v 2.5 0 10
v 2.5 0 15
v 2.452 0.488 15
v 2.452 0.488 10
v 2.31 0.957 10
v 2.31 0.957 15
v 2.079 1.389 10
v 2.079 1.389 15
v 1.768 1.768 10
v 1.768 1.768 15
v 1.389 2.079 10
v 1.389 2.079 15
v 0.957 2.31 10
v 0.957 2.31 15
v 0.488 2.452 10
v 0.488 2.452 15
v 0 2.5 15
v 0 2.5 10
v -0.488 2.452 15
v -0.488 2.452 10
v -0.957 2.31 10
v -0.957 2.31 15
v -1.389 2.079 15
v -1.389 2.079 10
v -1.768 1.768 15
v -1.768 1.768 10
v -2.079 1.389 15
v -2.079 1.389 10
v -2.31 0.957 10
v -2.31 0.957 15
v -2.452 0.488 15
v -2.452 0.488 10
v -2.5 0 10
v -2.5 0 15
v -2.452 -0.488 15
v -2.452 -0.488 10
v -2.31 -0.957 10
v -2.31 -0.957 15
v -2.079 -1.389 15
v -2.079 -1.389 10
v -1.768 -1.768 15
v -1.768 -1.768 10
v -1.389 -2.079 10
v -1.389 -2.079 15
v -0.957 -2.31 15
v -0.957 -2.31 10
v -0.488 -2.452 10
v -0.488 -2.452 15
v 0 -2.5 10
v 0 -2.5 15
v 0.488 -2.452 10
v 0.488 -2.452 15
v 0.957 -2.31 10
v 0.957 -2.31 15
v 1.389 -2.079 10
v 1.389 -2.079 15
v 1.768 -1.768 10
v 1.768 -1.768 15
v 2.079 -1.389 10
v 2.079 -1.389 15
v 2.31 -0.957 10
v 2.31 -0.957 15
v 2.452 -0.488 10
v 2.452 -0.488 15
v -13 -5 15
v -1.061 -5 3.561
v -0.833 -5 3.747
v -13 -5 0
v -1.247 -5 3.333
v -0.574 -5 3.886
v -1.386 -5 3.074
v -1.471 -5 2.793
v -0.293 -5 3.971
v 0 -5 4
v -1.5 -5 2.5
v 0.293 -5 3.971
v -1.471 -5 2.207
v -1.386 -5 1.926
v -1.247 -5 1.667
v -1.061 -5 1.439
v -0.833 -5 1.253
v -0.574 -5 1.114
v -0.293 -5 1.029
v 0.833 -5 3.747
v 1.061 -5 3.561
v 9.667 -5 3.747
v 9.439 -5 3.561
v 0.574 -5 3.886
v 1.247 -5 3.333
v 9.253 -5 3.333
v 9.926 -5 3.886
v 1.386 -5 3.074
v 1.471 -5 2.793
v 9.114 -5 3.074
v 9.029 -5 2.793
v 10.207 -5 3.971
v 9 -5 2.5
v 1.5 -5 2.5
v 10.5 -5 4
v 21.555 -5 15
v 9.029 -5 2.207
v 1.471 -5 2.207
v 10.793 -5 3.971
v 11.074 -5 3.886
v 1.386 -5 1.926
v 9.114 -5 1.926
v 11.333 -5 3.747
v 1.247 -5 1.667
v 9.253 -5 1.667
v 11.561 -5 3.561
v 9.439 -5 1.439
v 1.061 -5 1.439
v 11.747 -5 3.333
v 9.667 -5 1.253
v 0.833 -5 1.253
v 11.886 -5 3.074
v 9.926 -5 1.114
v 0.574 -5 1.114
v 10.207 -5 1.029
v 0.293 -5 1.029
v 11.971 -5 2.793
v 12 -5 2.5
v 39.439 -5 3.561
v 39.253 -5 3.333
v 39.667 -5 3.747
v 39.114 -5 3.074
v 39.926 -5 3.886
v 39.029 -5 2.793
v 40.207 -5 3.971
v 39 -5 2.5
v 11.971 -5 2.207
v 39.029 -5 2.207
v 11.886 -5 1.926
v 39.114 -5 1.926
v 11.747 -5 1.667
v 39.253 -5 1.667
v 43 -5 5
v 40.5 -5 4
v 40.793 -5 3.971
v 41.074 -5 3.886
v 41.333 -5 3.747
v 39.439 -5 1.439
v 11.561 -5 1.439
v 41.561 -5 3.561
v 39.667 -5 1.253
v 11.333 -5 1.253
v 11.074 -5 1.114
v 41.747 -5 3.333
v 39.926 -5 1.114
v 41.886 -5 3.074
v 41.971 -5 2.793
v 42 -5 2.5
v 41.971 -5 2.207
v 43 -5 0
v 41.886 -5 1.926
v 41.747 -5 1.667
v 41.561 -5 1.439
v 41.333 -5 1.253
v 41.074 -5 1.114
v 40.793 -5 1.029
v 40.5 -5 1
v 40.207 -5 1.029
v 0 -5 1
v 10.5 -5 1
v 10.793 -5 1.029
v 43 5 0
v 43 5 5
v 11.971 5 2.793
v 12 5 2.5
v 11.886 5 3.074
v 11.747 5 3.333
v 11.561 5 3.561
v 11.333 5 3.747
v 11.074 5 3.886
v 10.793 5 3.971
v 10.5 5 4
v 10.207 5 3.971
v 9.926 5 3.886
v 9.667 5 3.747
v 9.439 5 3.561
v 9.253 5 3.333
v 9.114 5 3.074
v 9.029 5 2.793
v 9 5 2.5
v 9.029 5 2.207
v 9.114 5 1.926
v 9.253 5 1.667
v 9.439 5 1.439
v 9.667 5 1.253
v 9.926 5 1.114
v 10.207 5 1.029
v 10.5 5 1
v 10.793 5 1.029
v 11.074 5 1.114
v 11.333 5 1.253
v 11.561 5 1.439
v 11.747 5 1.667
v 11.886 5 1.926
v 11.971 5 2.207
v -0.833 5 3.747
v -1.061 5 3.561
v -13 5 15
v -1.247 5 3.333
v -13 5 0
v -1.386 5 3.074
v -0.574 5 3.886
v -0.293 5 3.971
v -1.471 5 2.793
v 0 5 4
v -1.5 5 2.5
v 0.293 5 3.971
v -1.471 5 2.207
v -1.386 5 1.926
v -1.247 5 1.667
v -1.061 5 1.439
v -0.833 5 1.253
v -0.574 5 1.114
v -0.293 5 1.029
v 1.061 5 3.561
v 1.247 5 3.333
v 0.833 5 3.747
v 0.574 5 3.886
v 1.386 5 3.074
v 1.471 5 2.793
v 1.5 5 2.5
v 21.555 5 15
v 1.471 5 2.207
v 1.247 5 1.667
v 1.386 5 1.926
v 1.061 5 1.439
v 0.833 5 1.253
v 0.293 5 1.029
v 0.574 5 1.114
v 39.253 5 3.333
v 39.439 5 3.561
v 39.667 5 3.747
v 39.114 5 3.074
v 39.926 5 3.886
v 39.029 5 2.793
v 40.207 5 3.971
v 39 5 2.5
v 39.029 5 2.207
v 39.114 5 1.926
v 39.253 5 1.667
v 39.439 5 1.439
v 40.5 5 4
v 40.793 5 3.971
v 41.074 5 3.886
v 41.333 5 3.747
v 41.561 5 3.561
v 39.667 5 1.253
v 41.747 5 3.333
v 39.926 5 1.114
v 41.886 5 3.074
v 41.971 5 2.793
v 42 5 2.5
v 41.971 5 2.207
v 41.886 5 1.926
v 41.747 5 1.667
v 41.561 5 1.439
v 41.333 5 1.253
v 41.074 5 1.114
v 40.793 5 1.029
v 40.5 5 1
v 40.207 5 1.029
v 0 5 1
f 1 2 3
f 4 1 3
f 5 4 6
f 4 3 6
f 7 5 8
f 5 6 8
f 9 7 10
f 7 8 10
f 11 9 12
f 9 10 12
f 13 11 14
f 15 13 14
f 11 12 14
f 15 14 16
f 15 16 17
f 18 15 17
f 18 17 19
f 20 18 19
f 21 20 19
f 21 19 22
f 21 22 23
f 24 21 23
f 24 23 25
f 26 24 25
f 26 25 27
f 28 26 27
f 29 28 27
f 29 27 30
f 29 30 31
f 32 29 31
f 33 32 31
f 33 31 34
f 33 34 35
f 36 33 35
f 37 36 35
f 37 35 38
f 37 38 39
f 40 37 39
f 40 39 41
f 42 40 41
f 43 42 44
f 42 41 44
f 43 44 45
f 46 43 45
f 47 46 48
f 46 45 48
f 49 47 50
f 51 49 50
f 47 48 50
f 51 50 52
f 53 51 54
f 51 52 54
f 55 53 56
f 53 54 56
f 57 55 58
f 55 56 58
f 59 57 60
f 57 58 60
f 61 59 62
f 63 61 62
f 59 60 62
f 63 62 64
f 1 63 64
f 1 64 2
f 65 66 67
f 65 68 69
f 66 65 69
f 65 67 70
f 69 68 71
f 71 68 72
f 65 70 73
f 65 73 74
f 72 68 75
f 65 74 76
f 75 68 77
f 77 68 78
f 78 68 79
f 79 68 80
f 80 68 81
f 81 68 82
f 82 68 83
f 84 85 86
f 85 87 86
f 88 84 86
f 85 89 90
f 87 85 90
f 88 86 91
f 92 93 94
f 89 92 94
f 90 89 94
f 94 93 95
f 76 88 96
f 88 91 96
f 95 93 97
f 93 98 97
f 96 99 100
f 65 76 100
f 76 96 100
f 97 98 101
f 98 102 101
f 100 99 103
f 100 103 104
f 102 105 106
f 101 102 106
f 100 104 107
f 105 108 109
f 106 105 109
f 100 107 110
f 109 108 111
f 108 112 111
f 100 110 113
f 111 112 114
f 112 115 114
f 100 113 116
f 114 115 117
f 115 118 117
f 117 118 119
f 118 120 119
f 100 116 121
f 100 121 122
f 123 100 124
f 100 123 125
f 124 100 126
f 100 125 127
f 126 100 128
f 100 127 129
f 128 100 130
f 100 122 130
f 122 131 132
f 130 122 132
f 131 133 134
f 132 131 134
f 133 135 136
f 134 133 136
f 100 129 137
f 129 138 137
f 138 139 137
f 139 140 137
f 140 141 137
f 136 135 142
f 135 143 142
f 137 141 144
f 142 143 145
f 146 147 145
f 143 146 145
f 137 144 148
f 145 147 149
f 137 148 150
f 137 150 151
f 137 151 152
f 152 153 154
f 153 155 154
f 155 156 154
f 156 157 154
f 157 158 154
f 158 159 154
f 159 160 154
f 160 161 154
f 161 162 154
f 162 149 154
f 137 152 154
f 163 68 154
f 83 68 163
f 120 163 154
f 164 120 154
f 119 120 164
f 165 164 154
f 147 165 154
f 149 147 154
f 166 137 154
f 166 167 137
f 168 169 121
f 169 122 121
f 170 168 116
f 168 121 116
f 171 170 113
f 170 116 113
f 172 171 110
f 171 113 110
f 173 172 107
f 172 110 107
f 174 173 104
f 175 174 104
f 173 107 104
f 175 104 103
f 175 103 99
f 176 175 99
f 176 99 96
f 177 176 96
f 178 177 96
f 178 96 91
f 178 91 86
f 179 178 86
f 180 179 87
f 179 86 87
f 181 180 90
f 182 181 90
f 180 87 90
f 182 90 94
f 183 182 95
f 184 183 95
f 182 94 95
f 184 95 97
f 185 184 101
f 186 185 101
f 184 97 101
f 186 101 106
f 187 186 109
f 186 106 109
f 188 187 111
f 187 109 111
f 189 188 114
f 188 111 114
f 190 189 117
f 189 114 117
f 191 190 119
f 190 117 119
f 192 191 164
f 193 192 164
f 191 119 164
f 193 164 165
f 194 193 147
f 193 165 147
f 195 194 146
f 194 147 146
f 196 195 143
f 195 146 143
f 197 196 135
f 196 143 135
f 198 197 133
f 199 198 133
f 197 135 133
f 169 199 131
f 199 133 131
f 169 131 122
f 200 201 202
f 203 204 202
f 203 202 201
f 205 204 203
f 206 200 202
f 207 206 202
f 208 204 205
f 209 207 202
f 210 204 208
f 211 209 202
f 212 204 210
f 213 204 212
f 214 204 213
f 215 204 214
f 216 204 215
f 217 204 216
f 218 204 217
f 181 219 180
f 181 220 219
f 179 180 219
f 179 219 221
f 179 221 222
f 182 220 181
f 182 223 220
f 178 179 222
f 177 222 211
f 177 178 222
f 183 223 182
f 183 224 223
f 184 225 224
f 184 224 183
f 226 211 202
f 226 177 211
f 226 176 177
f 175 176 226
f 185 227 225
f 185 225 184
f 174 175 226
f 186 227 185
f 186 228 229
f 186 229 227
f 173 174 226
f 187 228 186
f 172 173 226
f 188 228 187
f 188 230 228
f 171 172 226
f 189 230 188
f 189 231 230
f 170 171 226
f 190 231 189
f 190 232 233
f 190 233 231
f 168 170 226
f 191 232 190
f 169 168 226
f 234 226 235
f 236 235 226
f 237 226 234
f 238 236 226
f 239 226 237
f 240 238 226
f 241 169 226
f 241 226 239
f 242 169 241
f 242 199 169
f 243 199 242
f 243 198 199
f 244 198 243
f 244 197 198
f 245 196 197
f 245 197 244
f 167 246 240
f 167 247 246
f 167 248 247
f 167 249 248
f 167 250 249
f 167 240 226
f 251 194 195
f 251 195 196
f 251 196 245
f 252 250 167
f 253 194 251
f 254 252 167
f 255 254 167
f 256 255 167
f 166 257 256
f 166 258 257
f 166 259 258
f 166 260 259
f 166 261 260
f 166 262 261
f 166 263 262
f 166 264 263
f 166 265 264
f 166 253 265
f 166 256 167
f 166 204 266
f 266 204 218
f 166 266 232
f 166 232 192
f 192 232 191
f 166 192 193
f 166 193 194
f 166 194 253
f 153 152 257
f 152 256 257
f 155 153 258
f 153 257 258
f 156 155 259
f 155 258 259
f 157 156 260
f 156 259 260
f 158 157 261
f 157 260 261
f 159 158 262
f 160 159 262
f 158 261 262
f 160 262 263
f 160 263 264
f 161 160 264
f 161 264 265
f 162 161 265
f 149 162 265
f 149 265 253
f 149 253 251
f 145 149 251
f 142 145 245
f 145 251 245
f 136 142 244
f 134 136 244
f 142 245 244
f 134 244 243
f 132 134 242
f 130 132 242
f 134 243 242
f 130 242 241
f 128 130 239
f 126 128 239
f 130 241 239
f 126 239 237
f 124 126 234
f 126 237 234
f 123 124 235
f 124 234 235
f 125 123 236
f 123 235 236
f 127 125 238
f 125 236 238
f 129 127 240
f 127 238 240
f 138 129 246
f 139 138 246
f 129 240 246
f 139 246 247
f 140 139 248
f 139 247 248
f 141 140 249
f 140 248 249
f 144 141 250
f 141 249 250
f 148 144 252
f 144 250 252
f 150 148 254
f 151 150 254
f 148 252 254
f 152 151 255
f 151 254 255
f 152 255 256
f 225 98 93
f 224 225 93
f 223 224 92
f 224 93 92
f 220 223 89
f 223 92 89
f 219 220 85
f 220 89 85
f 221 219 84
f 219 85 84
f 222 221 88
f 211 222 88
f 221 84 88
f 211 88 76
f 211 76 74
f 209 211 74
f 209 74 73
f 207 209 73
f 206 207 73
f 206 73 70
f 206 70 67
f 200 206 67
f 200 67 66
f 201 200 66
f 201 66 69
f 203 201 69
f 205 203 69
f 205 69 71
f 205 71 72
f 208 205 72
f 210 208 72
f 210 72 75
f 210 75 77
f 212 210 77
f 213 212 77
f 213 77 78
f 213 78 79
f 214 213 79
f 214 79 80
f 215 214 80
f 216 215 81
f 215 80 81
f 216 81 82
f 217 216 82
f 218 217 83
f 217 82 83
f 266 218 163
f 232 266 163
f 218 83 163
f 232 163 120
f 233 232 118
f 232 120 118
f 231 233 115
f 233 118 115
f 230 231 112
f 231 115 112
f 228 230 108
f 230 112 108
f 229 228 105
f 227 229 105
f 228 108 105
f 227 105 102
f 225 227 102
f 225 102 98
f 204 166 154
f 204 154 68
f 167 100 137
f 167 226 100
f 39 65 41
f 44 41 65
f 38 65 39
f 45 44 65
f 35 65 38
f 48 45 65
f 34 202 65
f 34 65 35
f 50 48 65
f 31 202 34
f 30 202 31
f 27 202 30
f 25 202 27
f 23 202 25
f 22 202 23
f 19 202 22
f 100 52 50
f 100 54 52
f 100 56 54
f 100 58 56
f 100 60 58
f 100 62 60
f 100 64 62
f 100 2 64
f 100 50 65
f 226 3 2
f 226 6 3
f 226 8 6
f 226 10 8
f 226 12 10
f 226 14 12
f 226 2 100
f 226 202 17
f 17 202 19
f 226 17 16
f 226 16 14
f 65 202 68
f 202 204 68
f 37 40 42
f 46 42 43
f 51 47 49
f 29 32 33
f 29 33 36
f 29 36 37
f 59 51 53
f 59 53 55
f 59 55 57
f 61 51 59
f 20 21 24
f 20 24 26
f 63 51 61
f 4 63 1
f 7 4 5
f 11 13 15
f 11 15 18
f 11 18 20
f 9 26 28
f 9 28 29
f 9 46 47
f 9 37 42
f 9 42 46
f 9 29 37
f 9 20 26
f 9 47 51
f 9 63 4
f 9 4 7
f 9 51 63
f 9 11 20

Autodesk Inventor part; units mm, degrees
ref_plane "YZ Plane" through (0, 0, 0) normal (1, 0, 0) x (0, 1, 0)
ref_plane "XZ Plane" through (0, 0, 0) normal (0, 1, 0) x (-1, 0, 0)
ref_plane "XY Plane" through (0, 0, 0) normal (0, 0, 1) x (1, 0, 0)
sketch "스케치1" plane through (0, 0, 0) normal (0, 0, 1) x (1, 0, 0)
  line L0 (-13, -5) -> (13, -5)
  line L1 (13, -5) -> (13, 5)
  line L2 (13, 5) -> (-13, 5)
  line L3 (-13, 5) -> (-13, -5)
  line L4 (-13, -5) -> (13, 5) construction
  line L5 (13, -5) -> (-13, 5) construction
  point P0 (0, 0)
  dimension "d0" = 26
  dimension "d1" = 10
extrude "돌출1" add sketch "스케치1" along normal blind 15
sketch "스케치2" plane through (-13, -5, 0) normal (0, -1, 0) x (1, 0, 0)
  circle A0 centre (13, 2.5) radius 1.5
  line L0 (0, 0) -> (26, 0) projected
  line L1 (0, 0) -> (0, 15) projected
  circle A1 centre (23.5, 2.5) radius 1.5
  line L2 (26, 0) -> (26, 15) projected
  point P0 (13, 0)
  point P1 (13, 0)
  point P2 (13, 0)
  dimension "d4" = 3
  dimension "d7" = 2.5
  dimension "d11" = 2.5
  dimension "d12" = 2.5
extrude "돌출2" cut sketch "스케치2" against normal through all
sketch "스케치3" plane through (0, 0, 15) normal (0, 0, 1) x (1, 0, 0)
  circle A0 centre (0, 0) radius 2.5
  dimension "d8" = 5
extrude "돌출3" cut sketch "스케치3" against normal blind 5
sketch "스케치5" plane through (-13, 5, 0) normal (0, 1, 0) x (1, 0, 0)
  line L0 (26, -15) -> (34.5549, -15)
  line L1 (34.5549, -15) -> (56, -5)
  line L2 (56, -5) -> (56, 0)
  line L3 (56, 0) -> (26, 0)
  circle A0 centre (53.5, -2.5) radius 1.5
  line L4 (26, 0) -> (26, -15) projected
  point P0 (13, 0)
  point P1 (56, -2.5)
  dimension "d13" = 5
  dimension "d14" = 115
  dimension "d15" = 30
  dimension "d16" = 3
  dimension "d17" = 2.5
extrude "돌출4" add sketch "스케치5" against normal up to surface (10 mm away)
equation "\"d11\" = d7"
equation "\"d12\" = d11"
properties part number "Steering"
